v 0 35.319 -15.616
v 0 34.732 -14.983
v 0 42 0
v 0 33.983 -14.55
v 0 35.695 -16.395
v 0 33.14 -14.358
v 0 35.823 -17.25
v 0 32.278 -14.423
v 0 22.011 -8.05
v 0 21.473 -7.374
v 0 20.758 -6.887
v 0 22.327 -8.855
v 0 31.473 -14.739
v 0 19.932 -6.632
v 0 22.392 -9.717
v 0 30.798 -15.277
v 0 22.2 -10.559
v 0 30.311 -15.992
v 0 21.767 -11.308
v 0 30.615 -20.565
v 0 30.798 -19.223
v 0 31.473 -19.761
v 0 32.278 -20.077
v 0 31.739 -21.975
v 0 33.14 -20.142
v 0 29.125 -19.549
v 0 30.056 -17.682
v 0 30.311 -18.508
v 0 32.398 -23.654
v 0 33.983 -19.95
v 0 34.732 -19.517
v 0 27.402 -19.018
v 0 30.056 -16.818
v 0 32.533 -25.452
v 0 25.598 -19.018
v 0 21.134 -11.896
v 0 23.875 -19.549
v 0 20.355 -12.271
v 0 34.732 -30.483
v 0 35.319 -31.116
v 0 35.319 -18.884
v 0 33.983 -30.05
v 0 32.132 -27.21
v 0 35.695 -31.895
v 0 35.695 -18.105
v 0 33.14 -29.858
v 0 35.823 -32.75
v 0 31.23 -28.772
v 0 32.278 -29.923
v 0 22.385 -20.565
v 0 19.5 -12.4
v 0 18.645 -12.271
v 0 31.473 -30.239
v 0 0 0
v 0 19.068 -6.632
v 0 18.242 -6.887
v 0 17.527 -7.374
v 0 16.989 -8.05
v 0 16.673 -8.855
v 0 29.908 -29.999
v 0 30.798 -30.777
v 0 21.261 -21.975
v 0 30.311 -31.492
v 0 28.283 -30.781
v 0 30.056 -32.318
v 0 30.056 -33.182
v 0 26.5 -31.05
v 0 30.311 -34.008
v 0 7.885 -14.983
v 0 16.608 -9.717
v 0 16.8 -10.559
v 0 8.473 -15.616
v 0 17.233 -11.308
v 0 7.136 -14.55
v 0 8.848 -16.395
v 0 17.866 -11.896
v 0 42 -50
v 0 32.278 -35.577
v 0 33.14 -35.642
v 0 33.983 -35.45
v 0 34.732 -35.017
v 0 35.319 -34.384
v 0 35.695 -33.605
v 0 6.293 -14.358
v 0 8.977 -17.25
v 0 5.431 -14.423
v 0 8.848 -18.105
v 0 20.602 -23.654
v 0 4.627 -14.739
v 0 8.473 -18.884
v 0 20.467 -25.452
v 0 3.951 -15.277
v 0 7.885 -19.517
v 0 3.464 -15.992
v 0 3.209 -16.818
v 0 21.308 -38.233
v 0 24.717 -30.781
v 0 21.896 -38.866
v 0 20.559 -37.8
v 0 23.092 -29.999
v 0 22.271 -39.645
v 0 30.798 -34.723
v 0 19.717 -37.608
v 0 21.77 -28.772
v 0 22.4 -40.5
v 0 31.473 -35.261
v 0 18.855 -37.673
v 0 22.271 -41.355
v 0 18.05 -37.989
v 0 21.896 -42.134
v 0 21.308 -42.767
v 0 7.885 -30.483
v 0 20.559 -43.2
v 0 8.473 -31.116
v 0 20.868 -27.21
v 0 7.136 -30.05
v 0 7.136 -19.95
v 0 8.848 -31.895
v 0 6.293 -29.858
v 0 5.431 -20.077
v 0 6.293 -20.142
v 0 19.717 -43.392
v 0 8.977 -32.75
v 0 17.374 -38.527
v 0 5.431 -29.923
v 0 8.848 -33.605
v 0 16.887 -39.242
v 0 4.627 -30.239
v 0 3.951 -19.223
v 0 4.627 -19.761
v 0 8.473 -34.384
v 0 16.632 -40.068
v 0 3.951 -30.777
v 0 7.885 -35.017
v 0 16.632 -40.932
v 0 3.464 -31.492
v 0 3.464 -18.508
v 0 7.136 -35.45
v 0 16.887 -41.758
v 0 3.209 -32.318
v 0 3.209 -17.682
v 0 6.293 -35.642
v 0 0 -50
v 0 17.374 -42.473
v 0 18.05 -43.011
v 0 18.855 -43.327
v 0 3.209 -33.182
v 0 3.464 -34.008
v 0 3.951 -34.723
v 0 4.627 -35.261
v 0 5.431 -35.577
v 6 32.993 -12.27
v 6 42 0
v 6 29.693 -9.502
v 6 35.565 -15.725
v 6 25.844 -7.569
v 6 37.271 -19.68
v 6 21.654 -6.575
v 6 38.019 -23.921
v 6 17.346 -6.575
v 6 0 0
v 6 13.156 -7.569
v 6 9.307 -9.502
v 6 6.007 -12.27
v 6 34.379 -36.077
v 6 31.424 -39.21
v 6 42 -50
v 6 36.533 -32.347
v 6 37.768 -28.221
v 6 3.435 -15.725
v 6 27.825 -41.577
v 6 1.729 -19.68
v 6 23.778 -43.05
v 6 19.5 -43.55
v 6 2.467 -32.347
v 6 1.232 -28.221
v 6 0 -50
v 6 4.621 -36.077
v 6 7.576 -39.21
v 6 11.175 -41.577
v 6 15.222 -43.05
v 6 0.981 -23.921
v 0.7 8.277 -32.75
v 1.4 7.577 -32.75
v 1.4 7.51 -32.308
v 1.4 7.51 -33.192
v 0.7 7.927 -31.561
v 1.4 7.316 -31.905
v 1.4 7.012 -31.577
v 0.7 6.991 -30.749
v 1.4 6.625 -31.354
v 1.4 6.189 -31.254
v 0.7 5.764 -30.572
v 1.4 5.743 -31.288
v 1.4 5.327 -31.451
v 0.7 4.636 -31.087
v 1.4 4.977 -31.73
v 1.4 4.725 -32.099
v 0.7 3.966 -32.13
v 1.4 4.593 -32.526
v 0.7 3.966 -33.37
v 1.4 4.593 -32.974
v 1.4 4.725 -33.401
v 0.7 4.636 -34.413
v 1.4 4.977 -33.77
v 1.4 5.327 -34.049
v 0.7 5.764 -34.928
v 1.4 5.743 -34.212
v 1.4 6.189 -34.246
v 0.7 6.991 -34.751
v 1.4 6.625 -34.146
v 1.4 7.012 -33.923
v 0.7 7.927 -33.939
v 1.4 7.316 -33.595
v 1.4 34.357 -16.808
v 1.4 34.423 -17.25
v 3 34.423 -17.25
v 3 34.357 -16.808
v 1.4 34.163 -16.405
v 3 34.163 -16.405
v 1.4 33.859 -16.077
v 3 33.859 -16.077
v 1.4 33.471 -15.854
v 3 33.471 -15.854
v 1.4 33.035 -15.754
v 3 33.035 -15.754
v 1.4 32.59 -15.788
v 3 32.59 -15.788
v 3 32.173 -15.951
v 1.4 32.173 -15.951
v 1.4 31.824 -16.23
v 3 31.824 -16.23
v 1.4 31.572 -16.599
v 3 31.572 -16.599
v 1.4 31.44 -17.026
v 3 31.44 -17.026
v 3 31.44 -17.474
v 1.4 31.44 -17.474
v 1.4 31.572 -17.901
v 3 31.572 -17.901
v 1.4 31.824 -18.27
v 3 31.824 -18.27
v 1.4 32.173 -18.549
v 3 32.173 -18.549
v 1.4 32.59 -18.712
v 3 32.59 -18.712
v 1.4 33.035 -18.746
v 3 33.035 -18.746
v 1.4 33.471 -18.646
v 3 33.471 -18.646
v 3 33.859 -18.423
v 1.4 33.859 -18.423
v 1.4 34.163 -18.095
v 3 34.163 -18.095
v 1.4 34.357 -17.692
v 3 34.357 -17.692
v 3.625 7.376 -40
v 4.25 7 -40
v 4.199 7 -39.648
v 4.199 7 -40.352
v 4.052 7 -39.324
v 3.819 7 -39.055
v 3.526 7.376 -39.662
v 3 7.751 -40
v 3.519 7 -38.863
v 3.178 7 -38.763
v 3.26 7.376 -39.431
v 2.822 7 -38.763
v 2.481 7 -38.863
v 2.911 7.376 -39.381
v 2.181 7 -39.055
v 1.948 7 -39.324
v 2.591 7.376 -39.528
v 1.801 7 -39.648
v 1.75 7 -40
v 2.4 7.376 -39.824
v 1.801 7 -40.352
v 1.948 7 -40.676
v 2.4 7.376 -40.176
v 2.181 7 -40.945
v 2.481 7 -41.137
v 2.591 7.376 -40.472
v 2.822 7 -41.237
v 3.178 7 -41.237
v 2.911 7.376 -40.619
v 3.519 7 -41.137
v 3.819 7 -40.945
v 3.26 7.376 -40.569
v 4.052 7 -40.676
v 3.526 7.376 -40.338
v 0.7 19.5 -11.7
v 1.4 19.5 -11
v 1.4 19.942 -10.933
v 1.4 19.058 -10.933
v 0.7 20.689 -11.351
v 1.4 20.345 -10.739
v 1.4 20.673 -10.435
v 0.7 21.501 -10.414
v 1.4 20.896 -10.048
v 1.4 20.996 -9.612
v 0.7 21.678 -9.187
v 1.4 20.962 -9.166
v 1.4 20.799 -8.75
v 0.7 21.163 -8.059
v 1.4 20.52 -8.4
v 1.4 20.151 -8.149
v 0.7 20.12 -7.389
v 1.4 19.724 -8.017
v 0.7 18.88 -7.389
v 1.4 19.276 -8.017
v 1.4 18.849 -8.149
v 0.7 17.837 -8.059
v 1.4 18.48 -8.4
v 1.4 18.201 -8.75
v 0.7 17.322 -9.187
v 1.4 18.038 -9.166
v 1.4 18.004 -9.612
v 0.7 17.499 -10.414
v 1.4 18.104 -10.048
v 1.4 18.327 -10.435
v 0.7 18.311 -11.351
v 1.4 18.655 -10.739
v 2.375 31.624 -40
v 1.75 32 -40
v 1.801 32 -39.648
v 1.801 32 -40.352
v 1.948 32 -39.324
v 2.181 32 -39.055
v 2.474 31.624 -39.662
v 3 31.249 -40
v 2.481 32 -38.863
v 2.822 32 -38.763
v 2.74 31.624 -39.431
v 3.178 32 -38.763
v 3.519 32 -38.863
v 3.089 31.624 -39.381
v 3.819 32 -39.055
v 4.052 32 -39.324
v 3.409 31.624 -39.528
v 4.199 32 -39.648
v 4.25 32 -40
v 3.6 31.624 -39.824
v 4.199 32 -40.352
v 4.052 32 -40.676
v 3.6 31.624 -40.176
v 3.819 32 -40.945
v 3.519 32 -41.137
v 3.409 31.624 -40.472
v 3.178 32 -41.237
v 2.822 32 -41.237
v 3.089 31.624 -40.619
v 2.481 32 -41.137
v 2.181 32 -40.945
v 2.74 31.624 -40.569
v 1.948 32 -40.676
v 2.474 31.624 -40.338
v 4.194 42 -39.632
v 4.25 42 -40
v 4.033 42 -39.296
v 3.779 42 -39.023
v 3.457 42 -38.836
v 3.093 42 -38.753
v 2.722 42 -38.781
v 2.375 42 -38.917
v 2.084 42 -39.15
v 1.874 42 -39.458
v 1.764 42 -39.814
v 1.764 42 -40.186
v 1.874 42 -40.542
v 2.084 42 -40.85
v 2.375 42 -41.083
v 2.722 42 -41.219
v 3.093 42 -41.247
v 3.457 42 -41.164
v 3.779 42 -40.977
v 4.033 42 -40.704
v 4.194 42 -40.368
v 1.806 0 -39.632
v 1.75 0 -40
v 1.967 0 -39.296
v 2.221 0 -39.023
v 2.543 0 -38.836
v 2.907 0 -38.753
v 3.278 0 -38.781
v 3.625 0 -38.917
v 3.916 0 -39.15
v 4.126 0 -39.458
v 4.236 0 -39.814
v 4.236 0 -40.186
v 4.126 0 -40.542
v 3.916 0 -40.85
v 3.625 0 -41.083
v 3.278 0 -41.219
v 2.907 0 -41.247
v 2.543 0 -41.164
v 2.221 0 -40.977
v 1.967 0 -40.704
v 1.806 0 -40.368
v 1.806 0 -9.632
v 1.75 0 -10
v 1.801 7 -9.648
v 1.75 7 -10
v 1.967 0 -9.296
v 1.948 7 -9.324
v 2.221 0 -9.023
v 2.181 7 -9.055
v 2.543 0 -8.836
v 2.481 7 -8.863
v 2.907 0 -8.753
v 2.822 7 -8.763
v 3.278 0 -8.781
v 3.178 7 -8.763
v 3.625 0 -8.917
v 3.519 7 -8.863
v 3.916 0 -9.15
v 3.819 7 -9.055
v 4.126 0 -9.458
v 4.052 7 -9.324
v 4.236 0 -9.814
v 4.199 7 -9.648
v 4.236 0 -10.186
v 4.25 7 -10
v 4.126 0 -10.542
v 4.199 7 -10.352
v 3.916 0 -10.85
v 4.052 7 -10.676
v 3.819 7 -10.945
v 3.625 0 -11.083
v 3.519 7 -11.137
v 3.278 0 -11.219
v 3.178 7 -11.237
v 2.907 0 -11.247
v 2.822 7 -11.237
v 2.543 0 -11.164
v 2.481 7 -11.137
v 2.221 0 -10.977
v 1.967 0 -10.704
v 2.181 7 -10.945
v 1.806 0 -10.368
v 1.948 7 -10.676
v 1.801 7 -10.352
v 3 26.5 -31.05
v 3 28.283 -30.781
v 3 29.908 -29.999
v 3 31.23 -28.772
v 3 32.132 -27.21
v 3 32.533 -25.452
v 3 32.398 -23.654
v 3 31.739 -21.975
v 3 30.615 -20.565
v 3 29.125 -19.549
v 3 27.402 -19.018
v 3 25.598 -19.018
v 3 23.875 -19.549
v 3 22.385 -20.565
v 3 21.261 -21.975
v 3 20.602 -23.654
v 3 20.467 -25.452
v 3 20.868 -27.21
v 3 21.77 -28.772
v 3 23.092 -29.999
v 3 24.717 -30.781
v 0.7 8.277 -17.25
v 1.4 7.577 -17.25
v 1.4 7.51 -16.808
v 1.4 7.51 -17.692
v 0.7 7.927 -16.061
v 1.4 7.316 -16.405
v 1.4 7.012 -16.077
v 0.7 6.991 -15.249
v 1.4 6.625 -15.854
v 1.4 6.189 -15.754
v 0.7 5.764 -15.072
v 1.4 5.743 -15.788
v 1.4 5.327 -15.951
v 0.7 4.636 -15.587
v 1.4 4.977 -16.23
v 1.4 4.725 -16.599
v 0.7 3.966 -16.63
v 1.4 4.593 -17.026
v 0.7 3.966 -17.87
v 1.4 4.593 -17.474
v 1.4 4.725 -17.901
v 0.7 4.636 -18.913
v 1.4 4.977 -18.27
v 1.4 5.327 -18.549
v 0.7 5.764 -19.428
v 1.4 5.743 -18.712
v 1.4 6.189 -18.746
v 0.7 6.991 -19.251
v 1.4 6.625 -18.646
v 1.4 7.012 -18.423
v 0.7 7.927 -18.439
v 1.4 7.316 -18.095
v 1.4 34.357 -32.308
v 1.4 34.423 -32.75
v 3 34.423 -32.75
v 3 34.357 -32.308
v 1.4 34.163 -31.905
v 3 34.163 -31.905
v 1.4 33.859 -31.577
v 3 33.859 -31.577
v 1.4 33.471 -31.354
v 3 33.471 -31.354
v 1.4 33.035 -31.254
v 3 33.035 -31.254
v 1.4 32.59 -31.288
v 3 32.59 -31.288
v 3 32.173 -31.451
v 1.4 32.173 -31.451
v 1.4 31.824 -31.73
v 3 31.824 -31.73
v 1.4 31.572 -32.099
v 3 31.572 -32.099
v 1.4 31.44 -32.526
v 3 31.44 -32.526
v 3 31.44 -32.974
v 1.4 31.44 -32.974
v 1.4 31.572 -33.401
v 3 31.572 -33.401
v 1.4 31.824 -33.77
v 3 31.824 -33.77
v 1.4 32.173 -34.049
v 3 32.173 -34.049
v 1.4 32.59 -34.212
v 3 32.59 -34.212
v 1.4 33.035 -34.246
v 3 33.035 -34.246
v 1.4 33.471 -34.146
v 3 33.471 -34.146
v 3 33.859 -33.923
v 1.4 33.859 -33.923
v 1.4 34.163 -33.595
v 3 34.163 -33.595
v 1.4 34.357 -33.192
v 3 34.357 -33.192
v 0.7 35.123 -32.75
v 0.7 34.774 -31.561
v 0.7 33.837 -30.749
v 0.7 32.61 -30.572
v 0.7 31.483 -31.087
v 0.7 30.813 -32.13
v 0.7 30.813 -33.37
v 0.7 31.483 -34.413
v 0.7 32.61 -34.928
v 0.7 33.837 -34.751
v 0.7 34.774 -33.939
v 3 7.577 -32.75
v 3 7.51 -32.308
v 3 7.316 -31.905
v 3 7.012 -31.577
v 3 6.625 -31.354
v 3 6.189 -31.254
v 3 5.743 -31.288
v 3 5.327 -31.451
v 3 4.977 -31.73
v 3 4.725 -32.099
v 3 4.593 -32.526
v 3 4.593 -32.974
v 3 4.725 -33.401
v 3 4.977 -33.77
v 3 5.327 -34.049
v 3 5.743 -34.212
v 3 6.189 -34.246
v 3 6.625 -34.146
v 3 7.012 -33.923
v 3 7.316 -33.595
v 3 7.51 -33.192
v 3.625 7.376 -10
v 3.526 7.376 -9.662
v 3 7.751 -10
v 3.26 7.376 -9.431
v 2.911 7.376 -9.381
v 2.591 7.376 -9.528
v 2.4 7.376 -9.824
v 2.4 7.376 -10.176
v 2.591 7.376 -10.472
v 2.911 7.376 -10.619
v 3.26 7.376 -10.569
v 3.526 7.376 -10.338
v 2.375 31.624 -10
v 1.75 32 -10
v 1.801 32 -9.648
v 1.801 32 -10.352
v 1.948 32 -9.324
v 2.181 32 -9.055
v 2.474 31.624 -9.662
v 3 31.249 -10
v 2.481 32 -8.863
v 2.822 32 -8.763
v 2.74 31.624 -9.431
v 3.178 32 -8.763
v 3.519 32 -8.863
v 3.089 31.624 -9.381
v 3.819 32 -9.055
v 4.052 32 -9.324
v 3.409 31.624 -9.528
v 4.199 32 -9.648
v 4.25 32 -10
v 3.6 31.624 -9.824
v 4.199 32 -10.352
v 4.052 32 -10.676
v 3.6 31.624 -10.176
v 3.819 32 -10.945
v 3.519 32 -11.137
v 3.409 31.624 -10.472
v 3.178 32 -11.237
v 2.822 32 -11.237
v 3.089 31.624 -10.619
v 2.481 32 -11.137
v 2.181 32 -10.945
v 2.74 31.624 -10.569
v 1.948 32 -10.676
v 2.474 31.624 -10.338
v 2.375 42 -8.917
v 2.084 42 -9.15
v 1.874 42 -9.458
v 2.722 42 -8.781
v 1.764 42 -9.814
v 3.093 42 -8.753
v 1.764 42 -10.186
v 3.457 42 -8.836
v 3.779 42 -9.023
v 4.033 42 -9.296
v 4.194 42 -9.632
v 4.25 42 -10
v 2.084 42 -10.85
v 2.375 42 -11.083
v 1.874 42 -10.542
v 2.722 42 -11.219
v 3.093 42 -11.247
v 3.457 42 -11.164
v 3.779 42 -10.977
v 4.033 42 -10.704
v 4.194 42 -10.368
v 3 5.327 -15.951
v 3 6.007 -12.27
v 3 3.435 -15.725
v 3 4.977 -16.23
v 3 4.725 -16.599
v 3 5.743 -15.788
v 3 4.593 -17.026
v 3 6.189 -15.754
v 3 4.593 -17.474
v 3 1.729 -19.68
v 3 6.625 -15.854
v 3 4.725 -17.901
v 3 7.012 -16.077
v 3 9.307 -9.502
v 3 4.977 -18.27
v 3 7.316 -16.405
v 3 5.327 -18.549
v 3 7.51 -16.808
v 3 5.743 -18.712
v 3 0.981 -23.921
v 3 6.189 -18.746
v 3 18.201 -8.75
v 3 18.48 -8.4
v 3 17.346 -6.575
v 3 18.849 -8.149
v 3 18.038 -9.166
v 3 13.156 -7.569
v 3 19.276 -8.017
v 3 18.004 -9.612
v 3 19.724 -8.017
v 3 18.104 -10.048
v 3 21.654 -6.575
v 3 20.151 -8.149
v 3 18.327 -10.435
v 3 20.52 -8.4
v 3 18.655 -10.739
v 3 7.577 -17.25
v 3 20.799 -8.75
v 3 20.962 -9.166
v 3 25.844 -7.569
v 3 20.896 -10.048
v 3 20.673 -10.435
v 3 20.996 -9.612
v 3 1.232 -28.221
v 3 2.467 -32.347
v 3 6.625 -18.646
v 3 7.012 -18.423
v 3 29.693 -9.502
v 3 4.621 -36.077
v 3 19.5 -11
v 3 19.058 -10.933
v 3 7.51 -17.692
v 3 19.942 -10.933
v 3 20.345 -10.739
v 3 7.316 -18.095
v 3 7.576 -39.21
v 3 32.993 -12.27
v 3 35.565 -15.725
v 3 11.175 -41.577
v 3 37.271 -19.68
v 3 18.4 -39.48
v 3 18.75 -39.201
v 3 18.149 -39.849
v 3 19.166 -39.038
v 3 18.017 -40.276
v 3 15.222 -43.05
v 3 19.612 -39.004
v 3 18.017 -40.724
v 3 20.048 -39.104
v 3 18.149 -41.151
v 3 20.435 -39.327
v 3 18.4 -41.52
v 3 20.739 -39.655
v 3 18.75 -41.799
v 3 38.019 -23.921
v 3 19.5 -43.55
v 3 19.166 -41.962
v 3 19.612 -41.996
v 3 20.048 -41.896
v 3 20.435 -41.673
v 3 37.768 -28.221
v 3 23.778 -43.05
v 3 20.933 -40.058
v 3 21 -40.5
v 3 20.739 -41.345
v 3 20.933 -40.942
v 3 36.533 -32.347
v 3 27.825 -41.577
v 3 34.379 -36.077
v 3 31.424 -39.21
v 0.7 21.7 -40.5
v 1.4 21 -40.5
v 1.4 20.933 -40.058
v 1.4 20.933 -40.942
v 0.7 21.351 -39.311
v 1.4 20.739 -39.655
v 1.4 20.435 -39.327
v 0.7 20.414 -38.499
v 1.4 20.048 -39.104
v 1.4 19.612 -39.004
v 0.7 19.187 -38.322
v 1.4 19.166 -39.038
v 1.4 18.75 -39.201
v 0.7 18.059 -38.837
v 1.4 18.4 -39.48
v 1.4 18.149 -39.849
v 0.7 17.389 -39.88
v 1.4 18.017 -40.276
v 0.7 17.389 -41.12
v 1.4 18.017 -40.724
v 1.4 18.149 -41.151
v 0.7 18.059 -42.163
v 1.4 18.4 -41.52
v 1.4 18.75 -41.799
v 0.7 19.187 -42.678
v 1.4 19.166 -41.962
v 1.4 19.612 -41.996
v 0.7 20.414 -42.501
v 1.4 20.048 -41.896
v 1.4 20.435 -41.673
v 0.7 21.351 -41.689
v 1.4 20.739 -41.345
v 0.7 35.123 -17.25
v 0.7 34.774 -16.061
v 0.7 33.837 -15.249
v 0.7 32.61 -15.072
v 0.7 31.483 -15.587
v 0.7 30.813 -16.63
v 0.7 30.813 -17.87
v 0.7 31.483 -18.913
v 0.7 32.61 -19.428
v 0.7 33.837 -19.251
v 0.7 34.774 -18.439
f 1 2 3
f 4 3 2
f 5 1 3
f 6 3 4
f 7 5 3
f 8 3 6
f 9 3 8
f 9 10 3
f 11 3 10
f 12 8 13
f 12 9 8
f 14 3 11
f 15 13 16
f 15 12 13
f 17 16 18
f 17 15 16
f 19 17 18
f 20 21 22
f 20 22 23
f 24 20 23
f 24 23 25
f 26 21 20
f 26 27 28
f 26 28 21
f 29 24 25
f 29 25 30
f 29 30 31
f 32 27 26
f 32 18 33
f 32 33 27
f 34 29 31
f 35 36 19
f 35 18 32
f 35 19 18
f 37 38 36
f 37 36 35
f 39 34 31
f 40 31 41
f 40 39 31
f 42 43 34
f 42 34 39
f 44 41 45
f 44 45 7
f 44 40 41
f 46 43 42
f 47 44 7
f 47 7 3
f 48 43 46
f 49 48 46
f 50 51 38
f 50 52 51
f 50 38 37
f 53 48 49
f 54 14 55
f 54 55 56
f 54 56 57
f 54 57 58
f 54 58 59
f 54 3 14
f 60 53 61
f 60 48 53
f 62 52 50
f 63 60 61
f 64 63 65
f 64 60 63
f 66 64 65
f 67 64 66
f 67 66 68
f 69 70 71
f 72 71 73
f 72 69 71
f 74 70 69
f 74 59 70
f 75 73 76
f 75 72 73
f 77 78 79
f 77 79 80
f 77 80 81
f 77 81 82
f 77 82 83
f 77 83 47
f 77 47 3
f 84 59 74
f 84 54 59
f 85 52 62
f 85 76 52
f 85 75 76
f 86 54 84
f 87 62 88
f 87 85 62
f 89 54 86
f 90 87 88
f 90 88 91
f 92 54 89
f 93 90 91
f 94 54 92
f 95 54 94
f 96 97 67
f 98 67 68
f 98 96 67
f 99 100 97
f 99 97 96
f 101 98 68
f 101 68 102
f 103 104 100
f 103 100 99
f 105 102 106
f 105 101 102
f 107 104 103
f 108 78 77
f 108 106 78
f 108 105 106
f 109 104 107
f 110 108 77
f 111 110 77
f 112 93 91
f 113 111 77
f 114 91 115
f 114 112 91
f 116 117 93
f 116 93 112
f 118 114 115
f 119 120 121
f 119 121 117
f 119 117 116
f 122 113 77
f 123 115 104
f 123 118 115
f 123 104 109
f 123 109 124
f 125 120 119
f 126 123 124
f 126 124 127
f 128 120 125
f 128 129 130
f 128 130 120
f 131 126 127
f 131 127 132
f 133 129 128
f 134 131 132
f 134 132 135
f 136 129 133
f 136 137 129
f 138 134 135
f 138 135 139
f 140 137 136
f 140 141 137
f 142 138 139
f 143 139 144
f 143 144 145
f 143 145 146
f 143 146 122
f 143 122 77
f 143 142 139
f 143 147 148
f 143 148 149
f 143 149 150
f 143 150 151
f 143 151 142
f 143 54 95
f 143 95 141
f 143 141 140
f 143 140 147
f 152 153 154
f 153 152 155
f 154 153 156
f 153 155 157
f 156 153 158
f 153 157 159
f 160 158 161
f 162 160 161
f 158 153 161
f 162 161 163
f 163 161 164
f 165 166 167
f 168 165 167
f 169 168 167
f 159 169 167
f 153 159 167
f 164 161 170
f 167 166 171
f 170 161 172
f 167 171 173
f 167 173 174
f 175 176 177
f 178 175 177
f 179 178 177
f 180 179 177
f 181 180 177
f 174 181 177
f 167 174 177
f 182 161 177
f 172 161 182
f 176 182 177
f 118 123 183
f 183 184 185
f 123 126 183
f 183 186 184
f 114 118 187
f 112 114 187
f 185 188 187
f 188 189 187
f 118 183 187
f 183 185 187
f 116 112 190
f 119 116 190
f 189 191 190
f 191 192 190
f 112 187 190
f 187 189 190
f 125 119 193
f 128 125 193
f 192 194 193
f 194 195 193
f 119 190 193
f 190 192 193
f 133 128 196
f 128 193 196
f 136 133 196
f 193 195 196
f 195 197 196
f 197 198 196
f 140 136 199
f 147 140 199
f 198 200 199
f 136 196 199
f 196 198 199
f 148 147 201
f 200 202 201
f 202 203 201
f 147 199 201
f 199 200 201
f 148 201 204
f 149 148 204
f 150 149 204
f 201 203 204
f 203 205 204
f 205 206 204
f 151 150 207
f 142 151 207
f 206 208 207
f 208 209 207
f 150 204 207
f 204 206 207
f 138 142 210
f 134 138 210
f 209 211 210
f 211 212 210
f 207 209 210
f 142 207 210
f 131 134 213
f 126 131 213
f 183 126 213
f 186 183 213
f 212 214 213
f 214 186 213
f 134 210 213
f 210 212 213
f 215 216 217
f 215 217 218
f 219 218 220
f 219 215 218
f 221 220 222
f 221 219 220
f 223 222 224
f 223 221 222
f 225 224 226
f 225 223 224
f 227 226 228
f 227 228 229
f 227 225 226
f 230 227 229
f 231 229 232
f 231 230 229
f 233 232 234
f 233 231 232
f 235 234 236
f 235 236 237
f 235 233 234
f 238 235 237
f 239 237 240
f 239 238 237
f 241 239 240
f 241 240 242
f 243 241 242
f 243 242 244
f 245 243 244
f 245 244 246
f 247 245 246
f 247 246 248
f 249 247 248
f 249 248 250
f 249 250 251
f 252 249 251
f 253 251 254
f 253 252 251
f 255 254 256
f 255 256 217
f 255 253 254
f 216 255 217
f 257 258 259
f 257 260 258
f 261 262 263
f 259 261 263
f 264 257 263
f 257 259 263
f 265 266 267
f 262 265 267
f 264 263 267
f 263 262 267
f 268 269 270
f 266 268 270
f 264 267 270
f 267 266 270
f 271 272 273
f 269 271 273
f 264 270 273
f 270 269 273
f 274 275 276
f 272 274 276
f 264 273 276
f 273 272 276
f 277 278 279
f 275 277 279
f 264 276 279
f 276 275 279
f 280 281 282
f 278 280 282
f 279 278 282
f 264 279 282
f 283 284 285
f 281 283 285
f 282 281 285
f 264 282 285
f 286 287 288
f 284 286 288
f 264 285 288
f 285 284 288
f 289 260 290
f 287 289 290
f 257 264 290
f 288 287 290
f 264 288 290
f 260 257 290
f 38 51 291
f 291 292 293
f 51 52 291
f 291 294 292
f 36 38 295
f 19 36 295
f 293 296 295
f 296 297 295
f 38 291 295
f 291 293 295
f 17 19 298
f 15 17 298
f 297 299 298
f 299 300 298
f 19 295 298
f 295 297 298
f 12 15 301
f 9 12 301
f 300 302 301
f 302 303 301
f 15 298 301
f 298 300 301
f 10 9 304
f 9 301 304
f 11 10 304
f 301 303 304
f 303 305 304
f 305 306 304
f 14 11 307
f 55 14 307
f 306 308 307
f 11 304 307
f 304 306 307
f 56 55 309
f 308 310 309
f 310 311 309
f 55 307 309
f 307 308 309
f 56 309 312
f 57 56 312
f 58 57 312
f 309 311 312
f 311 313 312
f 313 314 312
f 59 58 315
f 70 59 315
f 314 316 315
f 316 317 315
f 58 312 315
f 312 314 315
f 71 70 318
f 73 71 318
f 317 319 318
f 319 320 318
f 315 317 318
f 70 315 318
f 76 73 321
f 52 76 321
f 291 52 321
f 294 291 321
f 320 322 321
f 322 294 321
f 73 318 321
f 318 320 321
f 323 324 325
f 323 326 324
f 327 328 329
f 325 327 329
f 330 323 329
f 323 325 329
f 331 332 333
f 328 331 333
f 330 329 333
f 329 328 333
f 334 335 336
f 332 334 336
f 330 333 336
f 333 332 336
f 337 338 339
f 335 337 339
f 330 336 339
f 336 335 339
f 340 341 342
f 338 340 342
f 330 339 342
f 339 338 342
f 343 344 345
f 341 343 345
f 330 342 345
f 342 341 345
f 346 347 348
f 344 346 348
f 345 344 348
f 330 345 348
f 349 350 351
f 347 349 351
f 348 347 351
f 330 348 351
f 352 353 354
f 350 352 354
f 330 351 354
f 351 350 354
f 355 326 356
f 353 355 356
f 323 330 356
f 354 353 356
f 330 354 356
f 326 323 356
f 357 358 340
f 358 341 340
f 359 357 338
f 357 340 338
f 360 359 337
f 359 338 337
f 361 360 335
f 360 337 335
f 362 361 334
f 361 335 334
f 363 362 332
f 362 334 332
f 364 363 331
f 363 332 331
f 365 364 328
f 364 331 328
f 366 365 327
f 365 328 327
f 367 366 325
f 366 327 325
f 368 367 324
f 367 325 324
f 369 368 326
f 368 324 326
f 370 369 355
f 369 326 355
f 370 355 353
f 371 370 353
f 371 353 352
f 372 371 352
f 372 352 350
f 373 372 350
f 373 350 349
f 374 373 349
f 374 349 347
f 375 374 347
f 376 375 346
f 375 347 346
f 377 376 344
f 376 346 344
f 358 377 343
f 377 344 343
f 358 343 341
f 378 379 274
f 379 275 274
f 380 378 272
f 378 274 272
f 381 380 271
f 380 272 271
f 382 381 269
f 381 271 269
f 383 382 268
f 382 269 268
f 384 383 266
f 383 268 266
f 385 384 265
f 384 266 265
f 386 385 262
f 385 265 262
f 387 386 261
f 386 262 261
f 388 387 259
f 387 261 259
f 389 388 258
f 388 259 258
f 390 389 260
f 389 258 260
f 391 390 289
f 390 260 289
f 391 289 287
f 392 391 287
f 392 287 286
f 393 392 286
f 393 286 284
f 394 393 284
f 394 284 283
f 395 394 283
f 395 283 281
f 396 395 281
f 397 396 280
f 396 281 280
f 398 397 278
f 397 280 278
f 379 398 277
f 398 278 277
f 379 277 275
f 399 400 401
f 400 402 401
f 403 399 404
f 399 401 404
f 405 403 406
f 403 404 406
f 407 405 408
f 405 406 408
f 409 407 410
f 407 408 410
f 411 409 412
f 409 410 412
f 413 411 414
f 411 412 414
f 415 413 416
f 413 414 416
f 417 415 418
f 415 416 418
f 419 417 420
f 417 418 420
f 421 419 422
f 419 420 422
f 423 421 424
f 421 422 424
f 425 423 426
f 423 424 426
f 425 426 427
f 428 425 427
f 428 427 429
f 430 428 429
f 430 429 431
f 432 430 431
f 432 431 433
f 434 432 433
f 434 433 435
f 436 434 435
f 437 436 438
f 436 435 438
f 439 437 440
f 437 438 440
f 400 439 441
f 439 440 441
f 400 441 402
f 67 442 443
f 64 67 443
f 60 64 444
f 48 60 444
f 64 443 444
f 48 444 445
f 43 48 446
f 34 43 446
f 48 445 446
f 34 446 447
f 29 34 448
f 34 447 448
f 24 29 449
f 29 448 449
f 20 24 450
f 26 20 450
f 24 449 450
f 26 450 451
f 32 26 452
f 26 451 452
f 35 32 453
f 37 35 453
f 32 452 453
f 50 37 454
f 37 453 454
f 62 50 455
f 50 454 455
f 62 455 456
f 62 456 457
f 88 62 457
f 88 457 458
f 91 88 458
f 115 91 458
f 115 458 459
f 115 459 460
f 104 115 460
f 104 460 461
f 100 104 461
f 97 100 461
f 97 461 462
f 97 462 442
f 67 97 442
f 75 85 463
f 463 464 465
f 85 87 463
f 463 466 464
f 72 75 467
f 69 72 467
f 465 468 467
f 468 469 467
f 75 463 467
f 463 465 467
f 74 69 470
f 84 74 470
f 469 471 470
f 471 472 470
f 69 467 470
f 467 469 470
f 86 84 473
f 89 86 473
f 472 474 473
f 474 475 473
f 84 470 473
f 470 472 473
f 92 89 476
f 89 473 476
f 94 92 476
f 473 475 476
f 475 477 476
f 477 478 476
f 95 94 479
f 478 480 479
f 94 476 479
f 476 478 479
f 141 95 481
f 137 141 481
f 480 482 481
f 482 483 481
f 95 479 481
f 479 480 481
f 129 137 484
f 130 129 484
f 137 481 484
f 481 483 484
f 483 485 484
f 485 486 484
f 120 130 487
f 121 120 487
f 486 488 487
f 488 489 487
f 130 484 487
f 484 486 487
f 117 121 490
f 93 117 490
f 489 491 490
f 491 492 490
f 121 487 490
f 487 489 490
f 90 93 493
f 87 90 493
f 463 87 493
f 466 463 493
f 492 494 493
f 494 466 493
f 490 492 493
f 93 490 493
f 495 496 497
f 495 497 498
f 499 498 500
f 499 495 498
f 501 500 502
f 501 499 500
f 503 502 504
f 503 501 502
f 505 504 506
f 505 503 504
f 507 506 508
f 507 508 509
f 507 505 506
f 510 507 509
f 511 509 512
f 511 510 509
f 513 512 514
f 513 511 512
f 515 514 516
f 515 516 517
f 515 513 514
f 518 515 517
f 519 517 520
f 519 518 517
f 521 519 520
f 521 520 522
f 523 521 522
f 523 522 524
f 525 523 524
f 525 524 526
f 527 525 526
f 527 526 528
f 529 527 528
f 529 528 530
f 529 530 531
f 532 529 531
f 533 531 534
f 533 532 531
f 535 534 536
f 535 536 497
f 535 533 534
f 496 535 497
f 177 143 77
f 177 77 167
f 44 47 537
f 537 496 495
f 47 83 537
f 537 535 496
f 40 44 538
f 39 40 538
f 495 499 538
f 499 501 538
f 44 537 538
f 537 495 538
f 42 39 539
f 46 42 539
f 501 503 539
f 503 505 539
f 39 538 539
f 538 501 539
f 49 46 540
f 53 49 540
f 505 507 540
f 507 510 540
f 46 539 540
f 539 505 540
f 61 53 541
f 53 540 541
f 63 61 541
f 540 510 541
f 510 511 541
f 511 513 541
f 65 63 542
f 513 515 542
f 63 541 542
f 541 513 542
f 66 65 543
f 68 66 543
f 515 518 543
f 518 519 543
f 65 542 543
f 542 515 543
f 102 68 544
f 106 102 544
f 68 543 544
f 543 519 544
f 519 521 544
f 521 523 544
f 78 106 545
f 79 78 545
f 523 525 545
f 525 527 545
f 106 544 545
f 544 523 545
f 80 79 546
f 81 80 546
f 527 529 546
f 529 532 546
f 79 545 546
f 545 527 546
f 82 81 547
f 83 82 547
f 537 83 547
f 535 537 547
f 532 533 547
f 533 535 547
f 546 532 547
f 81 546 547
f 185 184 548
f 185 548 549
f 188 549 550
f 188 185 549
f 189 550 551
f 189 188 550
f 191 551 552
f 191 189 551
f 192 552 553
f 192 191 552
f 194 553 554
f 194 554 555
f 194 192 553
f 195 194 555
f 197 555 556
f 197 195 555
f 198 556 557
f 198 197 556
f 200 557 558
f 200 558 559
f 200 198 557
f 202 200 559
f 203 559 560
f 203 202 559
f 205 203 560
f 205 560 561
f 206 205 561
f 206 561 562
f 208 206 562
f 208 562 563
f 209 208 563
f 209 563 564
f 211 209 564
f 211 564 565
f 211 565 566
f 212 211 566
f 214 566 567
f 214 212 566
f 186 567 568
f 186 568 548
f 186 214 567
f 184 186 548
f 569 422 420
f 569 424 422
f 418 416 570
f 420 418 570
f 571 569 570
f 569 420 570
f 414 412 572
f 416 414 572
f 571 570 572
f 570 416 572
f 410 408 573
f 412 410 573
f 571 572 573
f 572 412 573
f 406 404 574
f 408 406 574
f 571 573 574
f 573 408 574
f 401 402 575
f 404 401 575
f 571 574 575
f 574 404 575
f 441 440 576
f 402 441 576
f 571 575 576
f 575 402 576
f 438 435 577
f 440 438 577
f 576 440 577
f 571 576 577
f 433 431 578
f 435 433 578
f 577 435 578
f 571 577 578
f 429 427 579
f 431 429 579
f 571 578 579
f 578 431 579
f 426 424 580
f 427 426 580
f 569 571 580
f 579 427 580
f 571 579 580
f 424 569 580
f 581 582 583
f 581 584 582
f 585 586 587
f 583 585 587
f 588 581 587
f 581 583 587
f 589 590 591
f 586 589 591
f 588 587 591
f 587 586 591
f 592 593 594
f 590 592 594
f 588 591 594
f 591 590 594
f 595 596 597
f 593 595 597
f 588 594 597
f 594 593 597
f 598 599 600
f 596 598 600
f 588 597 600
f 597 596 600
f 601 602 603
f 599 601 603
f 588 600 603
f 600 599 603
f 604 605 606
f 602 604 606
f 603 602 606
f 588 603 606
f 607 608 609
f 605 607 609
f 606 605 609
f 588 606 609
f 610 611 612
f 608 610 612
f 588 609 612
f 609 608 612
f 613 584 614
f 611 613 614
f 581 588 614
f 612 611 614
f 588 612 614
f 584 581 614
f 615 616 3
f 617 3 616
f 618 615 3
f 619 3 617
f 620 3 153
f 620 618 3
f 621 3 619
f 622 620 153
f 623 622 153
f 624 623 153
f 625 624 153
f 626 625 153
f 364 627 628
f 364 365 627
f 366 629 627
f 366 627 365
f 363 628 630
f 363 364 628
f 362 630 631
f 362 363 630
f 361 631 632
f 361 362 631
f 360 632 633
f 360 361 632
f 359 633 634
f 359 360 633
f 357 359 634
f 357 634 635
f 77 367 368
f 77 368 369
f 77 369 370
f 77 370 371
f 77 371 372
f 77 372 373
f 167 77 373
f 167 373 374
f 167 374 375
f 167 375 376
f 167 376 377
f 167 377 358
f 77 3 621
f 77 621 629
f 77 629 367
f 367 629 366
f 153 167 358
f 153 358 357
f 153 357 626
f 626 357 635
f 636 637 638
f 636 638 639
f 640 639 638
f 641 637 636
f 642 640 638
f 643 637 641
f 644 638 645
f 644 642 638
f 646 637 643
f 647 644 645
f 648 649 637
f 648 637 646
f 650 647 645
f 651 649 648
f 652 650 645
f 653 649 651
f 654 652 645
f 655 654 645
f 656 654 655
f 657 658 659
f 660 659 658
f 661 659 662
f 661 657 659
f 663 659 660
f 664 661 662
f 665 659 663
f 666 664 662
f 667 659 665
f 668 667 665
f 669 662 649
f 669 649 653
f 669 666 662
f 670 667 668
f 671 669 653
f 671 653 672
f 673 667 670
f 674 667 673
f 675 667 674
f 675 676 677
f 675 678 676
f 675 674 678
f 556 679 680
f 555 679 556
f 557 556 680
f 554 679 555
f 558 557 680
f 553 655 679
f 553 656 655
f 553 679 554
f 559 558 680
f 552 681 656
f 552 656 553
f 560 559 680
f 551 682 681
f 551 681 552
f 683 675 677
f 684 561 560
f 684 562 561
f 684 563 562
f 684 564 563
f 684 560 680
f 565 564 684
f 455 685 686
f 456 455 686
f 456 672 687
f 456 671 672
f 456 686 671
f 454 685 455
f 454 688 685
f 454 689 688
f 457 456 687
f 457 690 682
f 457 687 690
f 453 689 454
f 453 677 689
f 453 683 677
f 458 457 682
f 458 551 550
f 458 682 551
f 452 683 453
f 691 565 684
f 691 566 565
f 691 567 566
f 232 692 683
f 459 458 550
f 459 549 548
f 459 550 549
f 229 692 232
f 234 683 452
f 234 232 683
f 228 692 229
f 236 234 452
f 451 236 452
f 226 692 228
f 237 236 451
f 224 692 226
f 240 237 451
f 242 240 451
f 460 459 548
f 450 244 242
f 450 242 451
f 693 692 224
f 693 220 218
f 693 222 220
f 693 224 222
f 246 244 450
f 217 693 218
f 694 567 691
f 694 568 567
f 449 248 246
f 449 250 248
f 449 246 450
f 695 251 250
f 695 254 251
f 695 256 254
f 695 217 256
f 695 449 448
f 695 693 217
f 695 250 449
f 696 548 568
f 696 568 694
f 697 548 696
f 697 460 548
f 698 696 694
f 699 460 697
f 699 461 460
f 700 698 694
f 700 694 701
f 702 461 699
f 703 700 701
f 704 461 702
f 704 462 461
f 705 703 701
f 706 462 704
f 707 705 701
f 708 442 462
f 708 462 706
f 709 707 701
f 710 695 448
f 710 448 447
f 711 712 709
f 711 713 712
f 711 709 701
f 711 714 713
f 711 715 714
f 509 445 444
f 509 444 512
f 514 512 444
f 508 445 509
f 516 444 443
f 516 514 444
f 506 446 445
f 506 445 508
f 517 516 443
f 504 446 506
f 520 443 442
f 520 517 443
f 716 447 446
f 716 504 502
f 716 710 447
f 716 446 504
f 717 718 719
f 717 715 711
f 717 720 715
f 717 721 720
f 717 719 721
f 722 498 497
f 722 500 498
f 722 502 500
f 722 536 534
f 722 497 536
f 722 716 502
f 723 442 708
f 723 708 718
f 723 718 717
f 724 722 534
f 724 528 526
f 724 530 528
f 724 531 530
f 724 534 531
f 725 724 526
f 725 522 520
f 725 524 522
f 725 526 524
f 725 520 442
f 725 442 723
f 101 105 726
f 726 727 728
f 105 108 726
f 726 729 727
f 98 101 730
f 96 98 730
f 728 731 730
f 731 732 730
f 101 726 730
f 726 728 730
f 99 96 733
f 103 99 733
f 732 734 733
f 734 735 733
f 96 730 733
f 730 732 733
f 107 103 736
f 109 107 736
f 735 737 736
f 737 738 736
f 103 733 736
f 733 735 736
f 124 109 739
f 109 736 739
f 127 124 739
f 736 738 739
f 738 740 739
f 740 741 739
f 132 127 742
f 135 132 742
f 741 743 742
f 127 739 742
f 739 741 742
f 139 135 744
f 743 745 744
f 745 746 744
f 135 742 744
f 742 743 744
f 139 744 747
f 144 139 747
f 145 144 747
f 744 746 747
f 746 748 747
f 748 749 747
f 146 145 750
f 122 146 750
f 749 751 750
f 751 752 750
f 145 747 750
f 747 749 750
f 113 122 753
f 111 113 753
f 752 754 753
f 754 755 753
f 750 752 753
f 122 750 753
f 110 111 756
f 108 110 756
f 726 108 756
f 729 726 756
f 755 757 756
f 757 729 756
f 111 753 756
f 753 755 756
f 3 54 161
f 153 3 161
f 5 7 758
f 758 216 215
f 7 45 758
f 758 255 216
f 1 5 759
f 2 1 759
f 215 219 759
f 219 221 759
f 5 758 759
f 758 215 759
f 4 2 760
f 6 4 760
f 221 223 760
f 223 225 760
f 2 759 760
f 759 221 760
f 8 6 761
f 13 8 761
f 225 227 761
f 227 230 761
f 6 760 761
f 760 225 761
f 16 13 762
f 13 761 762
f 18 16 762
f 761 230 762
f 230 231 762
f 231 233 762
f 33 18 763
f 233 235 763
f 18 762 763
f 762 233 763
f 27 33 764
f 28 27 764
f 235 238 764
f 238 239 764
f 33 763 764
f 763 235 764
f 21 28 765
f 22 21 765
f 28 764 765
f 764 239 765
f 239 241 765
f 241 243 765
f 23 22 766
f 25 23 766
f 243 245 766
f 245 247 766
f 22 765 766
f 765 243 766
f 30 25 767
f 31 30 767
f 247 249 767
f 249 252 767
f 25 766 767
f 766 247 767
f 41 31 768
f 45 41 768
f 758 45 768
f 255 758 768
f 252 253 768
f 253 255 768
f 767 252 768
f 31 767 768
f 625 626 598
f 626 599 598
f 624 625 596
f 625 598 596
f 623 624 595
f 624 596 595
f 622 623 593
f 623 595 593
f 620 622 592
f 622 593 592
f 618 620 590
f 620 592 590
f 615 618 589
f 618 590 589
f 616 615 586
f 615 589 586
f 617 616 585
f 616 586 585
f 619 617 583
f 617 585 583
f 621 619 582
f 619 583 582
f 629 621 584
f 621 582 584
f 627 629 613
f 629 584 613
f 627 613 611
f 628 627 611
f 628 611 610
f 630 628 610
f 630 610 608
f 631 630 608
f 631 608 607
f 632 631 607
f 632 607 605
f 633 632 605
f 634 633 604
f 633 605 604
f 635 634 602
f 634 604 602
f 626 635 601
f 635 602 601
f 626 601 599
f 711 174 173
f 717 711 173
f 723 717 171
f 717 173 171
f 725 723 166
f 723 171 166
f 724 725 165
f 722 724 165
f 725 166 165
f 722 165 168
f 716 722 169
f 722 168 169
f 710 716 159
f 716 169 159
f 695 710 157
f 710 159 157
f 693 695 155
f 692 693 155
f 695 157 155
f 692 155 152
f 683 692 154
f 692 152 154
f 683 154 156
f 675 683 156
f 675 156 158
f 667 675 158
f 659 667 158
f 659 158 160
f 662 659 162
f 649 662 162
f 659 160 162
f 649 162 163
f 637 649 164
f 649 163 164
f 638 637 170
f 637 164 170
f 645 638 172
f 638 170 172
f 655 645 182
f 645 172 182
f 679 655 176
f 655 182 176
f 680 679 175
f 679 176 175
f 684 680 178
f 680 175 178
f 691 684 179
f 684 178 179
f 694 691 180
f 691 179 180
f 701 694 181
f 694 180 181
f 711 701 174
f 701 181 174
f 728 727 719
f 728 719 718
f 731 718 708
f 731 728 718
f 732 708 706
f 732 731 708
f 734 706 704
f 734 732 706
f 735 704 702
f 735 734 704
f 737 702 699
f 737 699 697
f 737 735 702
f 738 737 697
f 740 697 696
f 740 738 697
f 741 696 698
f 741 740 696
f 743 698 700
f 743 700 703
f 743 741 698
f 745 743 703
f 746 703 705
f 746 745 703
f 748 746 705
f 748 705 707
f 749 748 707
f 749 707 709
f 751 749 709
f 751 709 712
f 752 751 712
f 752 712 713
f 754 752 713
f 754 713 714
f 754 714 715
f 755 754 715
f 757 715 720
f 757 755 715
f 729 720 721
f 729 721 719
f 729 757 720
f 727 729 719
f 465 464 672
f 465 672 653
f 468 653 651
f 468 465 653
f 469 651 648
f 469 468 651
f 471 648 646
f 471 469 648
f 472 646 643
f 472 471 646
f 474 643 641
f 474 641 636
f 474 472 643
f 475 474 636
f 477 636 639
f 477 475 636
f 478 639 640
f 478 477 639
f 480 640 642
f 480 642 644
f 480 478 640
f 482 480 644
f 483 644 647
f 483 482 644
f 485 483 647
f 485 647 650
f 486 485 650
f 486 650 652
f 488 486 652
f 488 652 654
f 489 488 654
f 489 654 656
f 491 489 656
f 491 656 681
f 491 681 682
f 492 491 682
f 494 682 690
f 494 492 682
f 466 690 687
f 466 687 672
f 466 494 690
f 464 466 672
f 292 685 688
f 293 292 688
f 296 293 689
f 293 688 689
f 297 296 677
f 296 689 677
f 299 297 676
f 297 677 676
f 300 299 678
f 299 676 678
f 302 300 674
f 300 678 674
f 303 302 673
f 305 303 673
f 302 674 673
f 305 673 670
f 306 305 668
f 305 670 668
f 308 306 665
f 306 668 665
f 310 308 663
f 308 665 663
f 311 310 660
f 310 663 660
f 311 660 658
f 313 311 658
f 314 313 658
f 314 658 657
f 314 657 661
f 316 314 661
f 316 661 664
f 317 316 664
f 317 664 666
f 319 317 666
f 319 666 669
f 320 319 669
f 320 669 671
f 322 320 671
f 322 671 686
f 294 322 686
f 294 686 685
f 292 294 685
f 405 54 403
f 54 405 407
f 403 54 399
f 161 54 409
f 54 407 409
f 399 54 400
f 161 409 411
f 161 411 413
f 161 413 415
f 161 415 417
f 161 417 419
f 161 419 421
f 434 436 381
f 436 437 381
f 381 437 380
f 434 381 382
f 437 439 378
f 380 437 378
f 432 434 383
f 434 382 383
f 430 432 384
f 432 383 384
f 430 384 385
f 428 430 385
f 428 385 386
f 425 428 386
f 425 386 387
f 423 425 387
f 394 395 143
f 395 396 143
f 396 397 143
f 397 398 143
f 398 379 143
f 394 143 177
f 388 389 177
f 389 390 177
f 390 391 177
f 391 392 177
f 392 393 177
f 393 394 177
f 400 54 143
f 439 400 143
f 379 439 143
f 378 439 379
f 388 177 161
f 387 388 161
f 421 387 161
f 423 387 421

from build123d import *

# Parameters (mm, degrees)
SKETCH1_W                   = 6
SKETCH1_H                   = 50
BOSS_EXTRUDE1_DEPTH         = 42
TAP_DRILL_FOR_M3_TAP1_D     = 2.5
TAP_DRILL_FOR_M3_TAP1_DEPTH = 10
TAP_DRILL_FOR_M3_TAP1_TIP   = 0.751075774
TAP_DRILL_FOR_M3_TAP2_D     = 2.5
TAP_DRILL_FOR_M3_TAP2_DEPTH = 7
TAP_DRILL_FOR_M3_TAP2_TIP   = 0.751075774
SKETCH6_R                   = 18.55
CUT_EXTRUDE1_DEPTH          = 3
CUT_EXTRUDE2_REACH          = 67.368
SKETCH7_R                   = 6.05
SKETCH7_R_2                 = 1.5
CIRPATTERN1_OUTLINE_R       = 1.5
CIRPATTERN1_DEPTH           = 3
CHAMFER1_SIZE               = 1.4


# Read off the part's stored shape, not the designer's step: CirPattern1
with BuildPart() as part:
    # Sketch1 → Boss-Extrude1 (new body)
    with BuildSketch(Plane(origin=(0, 0, 0), x_dir=(1, 0, 0), z_dir=(0, 1, 0))):
        with Locations((3, 25)):
            Rectangle(SKETCH1_W, SKETCH1_H)
    extrude(amount=BOSS_EXTRUDE1_DEPTH)

    # Tap Drill for M3 Tap1
    with Locations(Plane(origin=(0, 42, 0), x_dir=(-1, 0, 0), z_dir=(0, 1, 0))):
        with Locations((-3, -10), (-3, -40)):
            Hole(TAP_DRILL_FOR_M3_TAP1_D / 2, depth=TAP_DRILL_FOR_M3_TAP1_DEPTH)
            with Locations((0, 0, -(TAP_DRILL_FOR_M3_TAP1_DEPTH + TAP_DRILL_FOR_M3_TAP1_TIP / 2))):  # 118° drill point
                Cone(0, TAP_DRILL_FOR_M3_TAP1_D / 2, TAP_DRILL_FOR_M3_TAP1_TIP, mode=Mode.SUBTRACT)

    # Tap Drill for M3 Tap2
    with Locations(Plane.XZ):
        with Locations((3, -10), (3, -40)):
            Hole(TAP_DRILL_FOR_M3_TAP2_D / 2, depth=TAP_DRILL_FOR_M3_TAP2_DEPTH)
            with Locations((0, 0, -(TAP_DRILL_FOR_M3_TAP2_DEPTH + TAP_DRILL_FOR_M3_TAP2_TIP / 2))):  # 118° drill point
                Cone(0, TAP_DRILL_FOR_M3_TAP2_D / 2, TAP_DRILL_FOR_M3_TAP2_TIP, mode=Mode.SUBTRACT)

    # Sketch6 → Cut-Extrude1 (cut)
    with BuildSketch(Plane(origin=(6, 0, 0), x_dir=(0, 0, -1), z_dir=(1, 0, 0))):
        with Locations((25, 19.5)):
            Circle(SKETCH6_R)
    extrude(amount=-CUT_EXTRUDE1_DEPTH, mode=Mode.SUBTRACT)

    # Sketch7 → Cut-Extrude2 (cut, up to next)
    with BuildSketch(Plane(origin=(3, 0, 0), x_dir=(0, 0, -1), z_dir=(1, 0, 0)), mode=Mode.PRIVATE) as cut_extrude2_sk1:
        with Locations((25, 26.5)):
            Circle(SKETCH7_R)
    cut_extrude2_tool1 = extrude(cut_extrude2_sk1.sketch, amount=-CUT_EXTRUDE2_REACH, mode=Mode.PRIVATE) & part.part
    # Sketch7 → Cut-Extrude2 (cut, up to next)
    with BuildSketch(Plane(origin=(3, 0, 0), x_dir=(0, 0, -1), z_dir=(1, 0, 0)), mode=Mode.PRIVATE) as cut_extrude2_sk2:
        with Locations((9.5, 19.5)):
            Circle(SKETCH7_R_2)
    cut_extrude2_tool2 = extrude(cut_extrude2_sk2.sketch, amount=-CUT_EXTRUDE2_REACH, mode=Mode.PRIVATE) & part.part
    add(cut_extrude2_tool1.solids().sort_by_distance((3, 26.5, -25))[0], mode=Mode.SUBTRACT)
    add(cut_extrude2_tool2.solids().sort_by_distance((3, 19.5, -9.5))[0], mode=Mode.SUBTRACT)

    # CirPattern1 outline → CirPattern1 (cut)
    with BuildSketch(Plane.YZ):
        with Locations((32.923393759, -17.25)):
            Circle(CIRPATTERN1_OUTLINE_R)
        with Locations((32.923393759, -32.75)):
            Circle(CIRPATTERN1_OUTLINE_R)
        with Locations((19.5, -40.5)):
            Circle(CIRPATTERN1_OUTLINE_R)
        with Locations((6.076606241, -32.75)):
            Circle(CIRPATTERN1_OUTLINE_R)
        with Locations((6.076606241, -17.25)):
            Circle(CIRPATTERN1_OUTLINE_R)
    extrude(amount=CIRPATTERN1_DEPTH, mode=Mode.SUBTRACT)

    # Chamfer1
    chamfer1_edges = [part.edges().sort_by_distance(p)[0] for p in [
        (0, 19.5, -8),
        (0, 4.576606241, -17.25),
        (0, 4.576606241, -32.75),
        (0, 18, -40.5),
        (0, 31.423393759, -32.75),
        (0, 31.423393759, -17.25),
    ]]
    chamfer(chamfer1_edges, length=CHAMFER1_SIZE)


solid = part.part
